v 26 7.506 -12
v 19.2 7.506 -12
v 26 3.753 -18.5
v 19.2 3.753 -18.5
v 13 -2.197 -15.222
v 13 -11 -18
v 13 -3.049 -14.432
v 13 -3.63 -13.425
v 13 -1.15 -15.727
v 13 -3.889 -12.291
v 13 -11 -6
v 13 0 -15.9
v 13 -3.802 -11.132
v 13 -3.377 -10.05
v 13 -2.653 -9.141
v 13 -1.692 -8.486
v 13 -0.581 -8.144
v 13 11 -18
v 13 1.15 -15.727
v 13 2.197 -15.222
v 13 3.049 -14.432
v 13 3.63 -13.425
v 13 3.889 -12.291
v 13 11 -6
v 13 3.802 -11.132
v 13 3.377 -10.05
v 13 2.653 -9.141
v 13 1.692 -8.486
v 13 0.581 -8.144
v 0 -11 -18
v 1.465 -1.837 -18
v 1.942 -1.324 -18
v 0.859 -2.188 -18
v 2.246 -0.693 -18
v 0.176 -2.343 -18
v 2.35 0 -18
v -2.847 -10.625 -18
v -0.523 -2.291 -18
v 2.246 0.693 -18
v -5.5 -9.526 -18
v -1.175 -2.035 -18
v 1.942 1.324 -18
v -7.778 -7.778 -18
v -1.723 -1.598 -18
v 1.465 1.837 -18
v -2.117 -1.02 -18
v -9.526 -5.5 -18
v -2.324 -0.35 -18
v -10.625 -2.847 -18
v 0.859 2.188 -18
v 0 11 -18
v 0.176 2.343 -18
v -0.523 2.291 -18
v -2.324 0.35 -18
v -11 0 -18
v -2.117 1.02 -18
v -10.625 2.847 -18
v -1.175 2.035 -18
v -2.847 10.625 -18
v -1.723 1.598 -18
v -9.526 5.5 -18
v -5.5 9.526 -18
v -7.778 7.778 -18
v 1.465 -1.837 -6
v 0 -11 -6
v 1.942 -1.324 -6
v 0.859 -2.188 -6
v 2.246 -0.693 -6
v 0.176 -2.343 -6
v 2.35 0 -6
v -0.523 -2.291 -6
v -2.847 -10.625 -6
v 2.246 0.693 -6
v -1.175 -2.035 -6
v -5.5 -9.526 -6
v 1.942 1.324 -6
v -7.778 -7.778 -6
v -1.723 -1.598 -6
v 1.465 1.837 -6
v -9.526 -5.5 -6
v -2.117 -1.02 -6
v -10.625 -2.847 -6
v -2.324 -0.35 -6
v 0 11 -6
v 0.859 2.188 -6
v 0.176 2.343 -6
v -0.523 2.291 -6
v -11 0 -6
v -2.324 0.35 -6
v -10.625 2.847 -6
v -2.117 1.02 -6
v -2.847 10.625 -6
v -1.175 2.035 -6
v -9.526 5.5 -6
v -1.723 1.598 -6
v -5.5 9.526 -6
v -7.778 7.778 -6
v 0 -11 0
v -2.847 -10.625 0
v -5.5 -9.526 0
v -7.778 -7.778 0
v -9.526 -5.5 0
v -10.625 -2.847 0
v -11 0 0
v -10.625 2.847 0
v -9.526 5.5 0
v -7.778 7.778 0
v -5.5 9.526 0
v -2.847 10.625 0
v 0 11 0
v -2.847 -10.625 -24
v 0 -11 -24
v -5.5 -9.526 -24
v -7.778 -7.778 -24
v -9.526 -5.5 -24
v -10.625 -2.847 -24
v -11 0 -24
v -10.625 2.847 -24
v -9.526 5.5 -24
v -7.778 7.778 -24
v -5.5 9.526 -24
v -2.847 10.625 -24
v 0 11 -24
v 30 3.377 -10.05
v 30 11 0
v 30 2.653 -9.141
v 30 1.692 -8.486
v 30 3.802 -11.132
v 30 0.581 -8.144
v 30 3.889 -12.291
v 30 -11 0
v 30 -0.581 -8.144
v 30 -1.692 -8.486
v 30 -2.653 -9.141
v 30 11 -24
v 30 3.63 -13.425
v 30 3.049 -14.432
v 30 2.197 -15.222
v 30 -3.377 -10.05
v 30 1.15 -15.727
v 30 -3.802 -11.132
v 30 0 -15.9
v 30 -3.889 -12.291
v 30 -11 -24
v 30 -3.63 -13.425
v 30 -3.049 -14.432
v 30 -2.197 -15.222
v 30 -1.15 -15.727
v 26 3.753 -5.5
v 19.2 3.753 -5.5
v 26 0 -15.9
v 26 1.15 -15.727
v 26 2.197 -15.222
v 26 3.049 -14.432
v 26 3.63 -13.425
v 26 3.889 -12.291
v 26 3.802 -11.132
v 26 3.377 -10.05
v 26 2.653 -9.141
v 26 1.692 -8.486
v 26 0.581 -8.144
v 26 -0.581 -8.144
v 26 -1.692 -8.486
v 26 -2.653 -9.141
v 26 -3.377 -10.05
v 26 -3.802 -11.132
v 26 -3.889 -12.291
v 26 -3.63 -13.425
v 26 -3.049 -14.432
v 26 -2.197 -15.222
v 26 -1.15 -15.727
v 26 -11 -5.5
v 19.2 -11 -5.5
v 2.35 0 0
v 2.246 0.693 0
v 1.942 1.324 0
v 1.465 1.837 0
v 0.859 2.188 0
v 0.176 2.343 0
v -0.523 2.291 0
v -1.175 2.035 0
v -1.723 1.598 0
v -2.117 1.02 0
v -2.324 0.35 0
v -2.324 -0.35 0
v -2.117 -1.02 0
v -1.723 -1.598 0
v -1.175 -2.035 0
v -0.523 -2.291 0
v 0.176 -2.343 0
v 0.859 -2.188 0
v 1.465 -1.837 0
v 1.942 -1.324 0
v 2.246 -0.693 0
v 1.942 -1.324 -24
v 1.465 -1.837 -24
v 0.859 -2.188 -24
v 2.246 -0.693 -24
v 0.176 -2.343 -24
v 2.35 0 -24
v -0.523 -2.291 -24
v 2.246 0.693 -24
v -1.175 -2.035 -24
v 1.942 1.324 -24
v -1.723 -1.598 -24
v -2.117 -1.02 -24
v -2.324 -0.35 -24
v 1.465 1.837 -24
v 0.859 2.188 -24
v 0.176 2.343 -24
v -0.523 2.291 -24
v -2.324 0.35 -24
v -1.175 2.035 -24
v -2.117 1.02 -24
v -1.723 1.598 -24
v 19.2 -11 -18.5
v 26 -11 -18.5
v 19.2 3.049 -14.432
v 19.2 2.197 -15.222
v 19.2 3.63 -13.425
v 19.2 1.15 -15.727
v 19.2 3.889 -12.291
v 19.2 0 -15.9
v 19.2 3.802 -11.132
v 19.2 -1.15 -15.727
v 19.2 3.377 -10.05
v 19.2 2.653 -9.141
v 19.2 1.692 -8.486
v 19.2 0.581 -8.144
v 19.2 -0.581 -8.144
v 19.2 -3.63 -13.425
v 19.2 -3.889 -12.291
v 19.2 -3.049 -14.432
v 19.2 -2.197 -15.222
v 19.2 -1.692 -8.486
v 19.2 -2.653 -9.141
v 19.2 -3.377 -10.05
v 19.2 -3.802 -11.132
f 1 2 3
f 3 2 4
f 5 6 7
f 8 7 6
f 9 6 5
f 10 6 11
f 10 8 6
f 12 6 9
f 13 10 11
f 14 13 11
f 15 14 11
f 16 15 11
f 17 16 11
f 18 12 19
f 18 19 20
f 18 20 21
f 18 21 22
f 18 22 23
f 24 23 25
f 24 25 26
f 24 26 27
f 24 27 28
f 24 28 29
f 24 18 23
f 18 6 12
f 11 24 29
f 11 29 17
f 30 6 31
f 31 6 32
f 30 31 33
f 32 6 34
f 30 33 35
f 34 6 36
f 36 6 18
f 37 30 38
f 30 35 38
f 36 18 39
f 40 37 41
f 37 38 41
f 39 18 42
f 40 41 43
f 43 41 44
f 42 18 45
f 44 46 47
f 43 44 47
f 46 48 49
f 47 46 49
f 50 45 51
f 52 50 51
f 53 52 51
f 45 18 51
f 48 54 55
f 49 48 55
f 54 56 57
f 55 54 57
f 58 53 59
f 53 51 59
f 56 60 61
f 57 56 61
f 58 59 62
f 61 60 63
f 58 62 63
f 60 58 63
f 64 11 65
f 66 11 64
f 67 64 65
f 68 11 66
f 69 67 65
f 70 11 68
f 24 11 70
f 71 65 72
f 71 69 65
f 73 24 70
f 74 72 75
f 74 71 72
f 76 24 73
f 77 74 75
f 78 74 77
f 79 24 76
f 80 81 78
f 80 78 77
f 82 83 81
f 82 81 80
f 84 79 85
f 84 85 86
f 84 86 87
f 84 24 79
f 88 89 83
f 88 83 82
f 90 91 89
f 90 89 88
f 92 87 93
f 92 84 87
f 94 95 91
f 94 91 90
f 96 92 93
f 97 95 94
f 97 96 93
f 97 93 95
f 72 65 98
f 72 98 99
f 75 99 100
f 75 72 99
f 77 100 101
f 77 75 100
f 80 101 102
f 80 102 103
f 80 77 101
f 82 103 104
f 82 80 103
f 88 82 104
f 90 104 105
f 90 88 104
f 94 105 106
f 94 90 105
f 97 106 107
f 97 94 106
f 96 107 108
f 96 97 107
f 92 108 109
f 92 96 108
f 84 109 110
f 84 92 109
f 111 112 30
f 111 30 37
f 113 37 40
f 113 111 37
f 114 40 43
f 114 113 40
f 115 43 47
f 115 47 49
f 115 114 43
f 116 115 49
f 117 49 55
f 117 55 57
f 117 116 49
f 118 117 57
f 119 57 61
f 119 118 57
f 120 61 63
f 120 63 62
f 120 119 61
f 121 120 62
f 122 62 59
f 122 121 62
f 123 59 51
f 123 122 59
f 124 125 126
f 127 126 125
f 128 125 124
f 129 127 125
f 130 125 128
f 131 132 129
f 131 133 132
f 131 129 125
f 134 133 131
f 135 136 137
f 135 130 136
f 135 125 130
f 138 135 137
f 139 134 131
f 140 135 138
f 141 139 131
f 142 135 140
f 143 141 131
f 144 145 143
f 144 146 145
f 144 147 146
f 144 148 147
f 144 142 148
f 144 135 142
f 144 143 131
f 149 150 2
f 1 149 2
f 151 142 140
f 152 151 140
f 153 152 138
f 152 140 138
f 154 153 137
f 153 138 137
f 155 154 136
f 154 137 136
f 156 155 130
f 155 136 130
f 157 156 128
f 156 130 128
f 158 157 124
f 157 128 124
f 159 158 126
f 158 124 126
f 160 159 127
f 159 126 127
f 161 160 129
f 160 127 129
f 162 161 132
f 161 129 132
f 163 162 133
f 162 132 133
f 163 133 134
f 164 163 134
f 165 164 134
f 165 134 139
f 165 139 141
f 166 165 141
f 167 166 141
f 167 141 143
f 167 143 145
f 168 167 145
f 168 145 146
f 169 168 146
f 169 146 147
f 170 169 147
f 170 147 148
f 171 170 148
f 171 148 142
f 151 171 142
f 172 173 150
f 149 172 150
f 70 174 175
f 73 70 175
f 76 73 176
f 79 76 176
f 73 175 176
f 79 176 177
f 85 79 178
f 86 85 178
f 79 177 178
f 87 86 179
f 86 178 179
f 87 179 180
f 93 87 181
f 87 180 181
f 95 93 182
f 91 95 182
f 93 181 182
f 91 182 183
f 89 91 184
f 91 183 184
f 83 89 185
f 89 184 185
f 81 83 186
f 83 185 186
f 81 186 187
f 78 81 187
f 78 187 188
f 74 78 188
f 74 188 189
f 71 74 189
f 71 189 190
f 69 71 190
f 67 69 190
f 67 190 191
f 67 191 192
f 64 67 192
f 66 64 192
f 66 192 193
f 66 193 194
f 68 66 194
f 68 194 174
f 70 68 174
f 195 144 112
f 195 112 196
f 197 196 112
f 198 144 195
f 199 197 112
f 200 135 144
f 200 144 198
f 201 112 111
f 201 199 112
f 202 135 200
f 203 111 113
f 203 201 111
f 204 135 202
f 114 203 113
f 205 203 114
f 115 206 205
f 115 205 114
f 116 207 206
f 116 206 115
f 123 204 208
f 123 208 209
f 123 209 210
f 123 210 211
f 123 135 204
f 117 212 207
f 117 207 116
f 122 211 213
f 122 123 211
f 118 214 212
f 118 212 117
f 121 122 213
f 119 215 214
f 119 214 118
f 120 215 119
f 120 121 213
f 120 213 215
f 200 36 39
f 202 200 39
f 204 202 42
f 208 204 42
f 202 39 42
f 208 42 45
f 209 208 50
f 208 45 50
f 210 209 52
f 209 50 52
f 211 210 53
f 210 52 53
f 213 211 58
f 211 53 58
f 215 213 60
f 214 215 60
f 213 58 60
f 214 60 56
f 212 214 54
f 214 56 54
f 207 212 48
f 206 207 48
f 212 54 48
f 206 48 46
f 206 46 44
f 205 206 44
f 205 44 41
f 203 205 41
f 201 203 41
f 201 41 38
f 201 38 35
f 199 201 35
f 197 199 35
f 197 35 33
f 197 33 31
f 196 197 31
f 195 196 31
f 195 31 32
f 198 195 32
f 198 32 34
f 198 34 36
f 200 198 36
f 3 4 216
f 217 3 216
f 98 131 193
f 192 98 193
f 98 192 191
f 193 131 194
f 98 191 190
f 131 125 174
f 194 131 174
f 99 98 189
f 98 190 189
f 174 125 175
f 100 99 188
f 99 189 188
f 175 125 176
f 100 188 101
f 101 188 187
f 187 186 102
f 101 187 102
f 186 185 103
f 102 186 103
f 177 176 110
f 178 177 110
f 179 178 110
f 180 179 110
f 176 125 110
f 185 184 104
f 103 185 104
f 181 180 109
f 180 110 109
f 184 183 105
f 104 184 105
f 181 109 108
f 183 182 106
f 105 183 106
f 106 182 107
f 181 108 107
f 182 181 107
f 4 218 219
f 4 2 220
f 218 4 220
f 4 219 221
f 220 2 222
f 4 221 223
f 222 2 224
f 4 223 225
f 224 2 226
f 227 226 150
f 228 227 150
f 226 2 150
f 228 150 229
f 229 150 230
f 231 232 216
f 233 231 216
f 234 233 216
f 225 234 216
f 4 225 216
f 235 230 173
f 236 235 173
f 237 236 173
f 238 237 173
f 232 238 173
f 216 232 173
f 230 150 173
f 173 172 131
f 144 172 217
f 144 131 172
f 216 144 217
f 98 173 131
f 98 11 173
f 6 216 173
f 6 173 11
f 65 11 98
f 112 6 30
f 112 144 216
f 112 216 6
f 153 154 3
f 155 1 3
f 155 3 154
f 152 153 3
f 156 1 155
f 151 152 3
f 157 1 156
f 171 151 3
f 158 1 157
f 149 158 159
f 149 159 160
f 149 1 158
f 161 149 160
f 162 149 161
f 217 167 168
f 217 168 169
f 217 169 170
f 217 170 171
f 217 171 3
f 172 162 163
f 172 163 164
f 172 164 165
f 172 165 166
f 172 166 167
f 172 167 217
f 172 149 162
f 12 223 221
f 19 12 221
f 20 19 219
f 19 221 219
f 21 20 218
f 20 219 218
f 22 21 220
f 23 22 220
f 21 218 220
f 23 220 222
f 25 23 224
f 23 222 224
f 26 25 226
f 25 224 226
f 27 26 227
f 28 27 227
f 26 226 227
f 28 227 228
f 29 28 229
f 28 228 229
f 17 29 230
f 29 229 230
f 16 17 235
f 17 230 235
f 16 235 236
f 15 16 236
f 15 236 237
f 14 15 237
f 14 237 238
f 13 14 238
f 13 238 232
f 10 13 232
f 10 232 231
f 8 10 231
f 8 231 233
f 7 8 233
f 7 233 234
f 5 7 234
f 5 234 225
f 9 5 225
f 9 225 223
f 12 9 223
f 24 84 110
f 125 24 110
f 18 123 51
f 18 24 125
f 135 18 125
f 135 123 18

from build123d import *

# Parameters (mm, degrees)
BOSS_EXTRUDE1_DEPTH            = 24
SKETCH2_W                      = 30.110806601
SKETCH2_H                      = 12
CUT_EXTRUDE1_DEPTH             = 45.271887242
CUT_EXTRUDE2_DEPTH             = 6.8
F_7_8_7_8_DIAMETER_HOLE1_D     = 7.8
F_7_8_7_8_DIAMETER_HOLE1_DEPTH = 6.2
F_7_8_7_8_DIAMETER_HOLE2_D     = 7.8
F_4_7_4_7_DIAMETER_HOLE1_D     = 4.7
F_4_7_4_7_DIAMETER_HOLE1_DEPTH = 6
F_4_7_4_7_DIAMETER_HOLE2_D     = 4.7


with BuildPart() as part:
    # Sketch1 → Boss-Extrude1 (new body)
    with BuildSketch(Plane(origin=(0, 0, -24), x_dir=(-1, 0, 0), z_dir=(0, 0, -1))):
        with BuildLine():
            Line((0, 11), (-30, 11))
            Line((-30, 11), (-30, -11))
            Line((-30, -11), (0, -11))
            ThreePointArc((0, -11), (11, 0), (0, 11))
        make_face()
    extrude(amount=-BOSS_EXTRUDE1_DEPTH)

    # Sketch2 → Cut-Extrude1 (cut, through all)
    with BuildSketch(Plane(origin=(0, 11, 0), x_dir=(-1, 0, 0), z_dir=(0, 1, 0))):
        with Locations((2.055403301, -12)):
            Rectangle(SKETCH2_W, SKETCH2_H)
    extrude(amount=-CUT_EXTRUDE1_DEPTH, mode=Mode.SUBTRACT)

    # Sketch3 → Cut-Extrude2 (cut)
    with BuildSketch(Plane(origin=(19.2, 0, 0), x_dir=(0, -1, 0), z_dir=(-1, 0, 0))):
        Polygon((11, -18.5), (11, -5.5), (-3.75277675, -5.5), (-7.505553499, -12), (-3.75277675, -18.5), align=None)
    extrude(amount=-CUT_EXTRUDE2_DEPTH, mode=Mode.SUBTRACT)

    # Ø7.8 (7.8) Diameter Hole1
    with Locations(Plane.ZY.offset(-13)):
        with Locations((-12, 0)):
            Hole(F_7_8_7_8_DIAMETER_HOLE1_D / 2, depth=F_7_8_7_8_DIAMETER_HOLE1_DEPTH)

    # Ø7.8 (7.8) Diameter Hole2 (through all)
    with Locations(Plane.ZY.offset(-26)):
        with Locations((-12, 0)):
            Hole(F_7_8_7_8_DIAMETER_HOLE2_D / 2)

    # Ø4.7 (4.7) Diameter Hole1
    with Locations(Plane(origin=(0, 0, -24), x_dir=(-1, 0, 0), z_dir=(0, 0, -1))):
        with Locations((0, 0)):
            Hole(F_4_7_4_7_DIAMETER_HOLE1_D / 2, depth=F_4_7_4_7_DIAMETER_HOLE1_DEPTH)

    # Ø4.7 (4.7) Diameter Hole2 (through all)
    with Locations(Plane(origin=(0, 0, -6), x_dir=(-1, 0, 0), z_dir=(0, 0, -1))):
        with Locations((0, 0)):
            Hole(F_4_7_4_7_DIAMETER_HOLE2_D / 2)


solid = part.part
